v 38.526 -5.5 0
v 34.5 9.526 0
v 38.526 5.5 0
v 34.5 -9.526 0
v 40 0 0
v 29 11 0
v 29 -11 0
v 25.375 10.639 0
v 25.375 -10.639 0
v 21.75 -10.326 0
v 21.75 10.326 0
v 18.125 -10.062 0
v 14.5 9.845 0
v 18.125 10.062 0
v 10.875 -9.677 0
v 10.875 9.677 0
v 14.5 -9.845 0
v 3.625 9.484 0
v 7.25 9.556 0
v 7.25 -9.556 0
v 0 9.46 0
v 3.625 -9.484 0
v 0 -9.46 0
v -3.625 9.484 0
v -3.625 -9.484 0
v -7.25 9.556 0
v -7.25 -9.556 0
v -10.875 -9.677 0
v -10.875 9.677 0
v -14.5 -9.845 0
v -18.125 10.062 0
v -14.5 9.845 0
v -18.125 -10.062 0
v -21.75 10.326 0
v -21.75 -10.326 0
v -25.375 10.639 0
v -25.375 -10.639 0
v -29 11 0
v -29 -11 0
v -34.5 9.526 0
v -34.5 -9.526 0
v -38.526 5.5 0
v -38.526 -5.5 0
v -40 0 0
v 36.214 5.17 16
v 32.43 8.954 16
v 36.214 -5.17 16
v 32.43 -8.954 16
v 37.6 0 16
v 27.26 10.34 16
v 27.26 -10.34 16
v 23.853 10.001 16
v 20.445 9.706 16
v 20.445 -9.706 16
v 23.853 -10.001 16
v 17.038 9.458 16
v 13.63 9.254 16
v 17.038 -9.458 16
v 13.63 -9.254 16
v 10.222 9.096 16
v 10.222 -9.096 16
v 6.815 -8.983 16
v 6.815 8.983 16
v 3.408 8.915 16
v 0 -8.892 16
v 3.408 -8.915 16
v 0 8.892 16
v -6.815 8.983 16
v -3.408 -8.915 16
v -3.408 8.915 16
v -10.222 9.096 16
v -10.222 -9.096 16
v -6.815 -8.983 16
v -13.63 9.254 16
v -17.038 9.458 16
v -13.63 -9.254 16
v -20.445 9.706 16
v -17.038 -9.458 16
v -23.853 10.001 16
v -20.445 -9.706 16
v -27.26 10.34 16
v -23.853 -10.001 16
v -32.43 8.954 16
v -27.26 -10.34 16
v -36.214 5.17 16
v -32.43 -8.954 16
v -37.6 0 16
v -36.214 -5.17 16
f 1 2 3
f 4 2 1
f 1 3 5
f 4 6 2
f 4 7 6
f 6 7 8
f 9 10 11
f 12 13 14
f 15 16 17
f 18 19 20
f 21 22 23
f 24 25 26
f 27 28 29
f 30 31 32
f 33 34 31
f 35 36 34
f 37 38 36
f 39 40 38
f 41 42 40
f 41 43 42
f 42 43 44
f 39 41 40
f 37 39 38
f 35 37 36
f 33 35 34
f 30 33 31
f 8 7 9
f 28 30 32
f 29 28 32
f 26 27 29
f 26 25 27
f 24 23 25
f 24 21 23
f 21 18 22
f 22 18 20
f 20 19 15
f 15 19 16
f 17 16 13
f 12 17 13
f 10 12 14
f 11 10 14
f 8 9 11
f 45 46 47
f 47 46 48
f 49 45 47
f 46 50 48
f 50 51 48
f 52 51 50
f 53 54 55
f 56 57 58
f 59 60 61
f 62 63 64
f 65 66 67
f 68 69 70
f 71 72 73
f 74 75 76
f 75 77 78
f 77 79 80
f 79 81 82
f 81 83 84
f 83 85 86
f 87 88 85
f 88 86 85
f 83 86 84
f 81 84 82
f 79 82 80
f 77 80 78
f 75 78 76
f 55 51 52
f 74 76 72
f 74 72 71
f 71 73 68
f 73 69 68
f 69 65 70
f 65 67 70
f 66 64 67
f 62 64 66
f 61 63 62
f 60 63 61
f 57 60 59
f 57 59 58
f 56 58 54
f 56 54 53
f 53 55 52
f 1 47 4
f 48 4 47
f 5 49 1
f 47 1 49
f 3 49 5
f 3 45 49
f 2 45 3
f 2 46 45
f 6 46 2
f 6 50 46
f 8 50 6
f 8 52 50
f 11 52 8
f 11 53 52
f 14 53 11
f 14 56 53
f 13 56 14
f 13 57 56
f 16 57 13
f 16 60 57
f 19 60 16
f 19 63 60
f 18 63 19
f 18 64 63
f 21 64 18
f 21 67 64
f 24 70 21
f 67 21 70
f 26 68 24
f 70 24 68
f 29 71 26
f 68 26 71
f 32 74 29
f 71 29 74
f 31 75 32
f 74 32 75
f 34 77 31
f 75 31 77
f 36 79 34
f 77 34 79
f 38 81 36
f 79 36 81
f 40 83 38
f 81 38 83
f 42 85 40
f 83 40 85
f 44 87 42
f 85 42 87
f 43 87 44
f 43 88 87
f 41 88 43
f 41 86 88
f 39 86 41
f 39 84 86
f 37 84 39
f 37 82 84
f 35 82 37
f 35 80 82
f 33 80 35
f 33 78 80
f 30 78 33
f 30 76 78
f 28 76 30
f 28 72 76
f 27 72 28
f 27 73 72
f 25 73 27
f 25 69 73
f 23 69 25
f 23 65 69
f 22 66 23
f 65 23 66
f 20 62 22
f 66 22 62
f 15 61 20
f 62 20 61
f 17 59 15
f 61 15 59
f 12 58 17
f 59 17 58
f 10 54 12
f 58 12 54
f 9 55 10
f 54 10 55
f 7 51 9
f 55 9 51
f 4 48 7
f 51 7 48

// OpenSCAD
$fn = 32;

// ----------------------------------------------------------------------
// Handle: 80 x 22 mm grip, 16 mm thick
// ----------------------------------------------------------------------

// --- parameters (mm) ---
length = 80;              // grip length
width = 22;               // grip width
thickness = 16;           // grip thickness
waist = 0.86;             // width factor at the middle
draft = 0.94;             // top face scale of the extrusion

/* ergonomic grip outline, closed spline-like polygon in the XY plane */
grip = [[-29, 11], [-25.375, 10.639], [-21.75, 10.326], [-18.125, 10.062], [-14.5, 9.845], [-10.875, 9.677], [-7.25, 9.556], [-3.625, 9.484], [0, 9.46], [3.625, 9.484], [7.25, 9.556], [10.875, 9.677], [14.5, 9.845], [18.125, 10.062], [21.75, 10.326], [25.375, 10.639], [29, 11], [34.5, 9.526], [38.526, 5.5], [40, 0], [38.526, -5.5], [34.5, -9.526], [29, -11], [29, -11], [25.375, -10.639], [21.75, -10.326], [18.125, -10.062], [14.5, -9.845], [10.875, -9.677], [7.25, -9.556], [3.625, -9.484], [0, -9.46], [-3.625, -9.484], [-7.25, -9.556], [-10.875, -9.677], [-14.5, -9.845], [-18.125, -10.062], [-21.75, -10.326], [-25.375, -10.639], [-29, -11], [-34.5, -9.526], [-38.526, -5.5], [-40, 0], [-38.526, 5.5], [-34.5, 9.526], [-29, 11]];

module grip_body() {
  linear_extrude(height = thickness, scale = draft) polygon(grip);
}

difference() {
  union() {
    grip_body();
  }
}
